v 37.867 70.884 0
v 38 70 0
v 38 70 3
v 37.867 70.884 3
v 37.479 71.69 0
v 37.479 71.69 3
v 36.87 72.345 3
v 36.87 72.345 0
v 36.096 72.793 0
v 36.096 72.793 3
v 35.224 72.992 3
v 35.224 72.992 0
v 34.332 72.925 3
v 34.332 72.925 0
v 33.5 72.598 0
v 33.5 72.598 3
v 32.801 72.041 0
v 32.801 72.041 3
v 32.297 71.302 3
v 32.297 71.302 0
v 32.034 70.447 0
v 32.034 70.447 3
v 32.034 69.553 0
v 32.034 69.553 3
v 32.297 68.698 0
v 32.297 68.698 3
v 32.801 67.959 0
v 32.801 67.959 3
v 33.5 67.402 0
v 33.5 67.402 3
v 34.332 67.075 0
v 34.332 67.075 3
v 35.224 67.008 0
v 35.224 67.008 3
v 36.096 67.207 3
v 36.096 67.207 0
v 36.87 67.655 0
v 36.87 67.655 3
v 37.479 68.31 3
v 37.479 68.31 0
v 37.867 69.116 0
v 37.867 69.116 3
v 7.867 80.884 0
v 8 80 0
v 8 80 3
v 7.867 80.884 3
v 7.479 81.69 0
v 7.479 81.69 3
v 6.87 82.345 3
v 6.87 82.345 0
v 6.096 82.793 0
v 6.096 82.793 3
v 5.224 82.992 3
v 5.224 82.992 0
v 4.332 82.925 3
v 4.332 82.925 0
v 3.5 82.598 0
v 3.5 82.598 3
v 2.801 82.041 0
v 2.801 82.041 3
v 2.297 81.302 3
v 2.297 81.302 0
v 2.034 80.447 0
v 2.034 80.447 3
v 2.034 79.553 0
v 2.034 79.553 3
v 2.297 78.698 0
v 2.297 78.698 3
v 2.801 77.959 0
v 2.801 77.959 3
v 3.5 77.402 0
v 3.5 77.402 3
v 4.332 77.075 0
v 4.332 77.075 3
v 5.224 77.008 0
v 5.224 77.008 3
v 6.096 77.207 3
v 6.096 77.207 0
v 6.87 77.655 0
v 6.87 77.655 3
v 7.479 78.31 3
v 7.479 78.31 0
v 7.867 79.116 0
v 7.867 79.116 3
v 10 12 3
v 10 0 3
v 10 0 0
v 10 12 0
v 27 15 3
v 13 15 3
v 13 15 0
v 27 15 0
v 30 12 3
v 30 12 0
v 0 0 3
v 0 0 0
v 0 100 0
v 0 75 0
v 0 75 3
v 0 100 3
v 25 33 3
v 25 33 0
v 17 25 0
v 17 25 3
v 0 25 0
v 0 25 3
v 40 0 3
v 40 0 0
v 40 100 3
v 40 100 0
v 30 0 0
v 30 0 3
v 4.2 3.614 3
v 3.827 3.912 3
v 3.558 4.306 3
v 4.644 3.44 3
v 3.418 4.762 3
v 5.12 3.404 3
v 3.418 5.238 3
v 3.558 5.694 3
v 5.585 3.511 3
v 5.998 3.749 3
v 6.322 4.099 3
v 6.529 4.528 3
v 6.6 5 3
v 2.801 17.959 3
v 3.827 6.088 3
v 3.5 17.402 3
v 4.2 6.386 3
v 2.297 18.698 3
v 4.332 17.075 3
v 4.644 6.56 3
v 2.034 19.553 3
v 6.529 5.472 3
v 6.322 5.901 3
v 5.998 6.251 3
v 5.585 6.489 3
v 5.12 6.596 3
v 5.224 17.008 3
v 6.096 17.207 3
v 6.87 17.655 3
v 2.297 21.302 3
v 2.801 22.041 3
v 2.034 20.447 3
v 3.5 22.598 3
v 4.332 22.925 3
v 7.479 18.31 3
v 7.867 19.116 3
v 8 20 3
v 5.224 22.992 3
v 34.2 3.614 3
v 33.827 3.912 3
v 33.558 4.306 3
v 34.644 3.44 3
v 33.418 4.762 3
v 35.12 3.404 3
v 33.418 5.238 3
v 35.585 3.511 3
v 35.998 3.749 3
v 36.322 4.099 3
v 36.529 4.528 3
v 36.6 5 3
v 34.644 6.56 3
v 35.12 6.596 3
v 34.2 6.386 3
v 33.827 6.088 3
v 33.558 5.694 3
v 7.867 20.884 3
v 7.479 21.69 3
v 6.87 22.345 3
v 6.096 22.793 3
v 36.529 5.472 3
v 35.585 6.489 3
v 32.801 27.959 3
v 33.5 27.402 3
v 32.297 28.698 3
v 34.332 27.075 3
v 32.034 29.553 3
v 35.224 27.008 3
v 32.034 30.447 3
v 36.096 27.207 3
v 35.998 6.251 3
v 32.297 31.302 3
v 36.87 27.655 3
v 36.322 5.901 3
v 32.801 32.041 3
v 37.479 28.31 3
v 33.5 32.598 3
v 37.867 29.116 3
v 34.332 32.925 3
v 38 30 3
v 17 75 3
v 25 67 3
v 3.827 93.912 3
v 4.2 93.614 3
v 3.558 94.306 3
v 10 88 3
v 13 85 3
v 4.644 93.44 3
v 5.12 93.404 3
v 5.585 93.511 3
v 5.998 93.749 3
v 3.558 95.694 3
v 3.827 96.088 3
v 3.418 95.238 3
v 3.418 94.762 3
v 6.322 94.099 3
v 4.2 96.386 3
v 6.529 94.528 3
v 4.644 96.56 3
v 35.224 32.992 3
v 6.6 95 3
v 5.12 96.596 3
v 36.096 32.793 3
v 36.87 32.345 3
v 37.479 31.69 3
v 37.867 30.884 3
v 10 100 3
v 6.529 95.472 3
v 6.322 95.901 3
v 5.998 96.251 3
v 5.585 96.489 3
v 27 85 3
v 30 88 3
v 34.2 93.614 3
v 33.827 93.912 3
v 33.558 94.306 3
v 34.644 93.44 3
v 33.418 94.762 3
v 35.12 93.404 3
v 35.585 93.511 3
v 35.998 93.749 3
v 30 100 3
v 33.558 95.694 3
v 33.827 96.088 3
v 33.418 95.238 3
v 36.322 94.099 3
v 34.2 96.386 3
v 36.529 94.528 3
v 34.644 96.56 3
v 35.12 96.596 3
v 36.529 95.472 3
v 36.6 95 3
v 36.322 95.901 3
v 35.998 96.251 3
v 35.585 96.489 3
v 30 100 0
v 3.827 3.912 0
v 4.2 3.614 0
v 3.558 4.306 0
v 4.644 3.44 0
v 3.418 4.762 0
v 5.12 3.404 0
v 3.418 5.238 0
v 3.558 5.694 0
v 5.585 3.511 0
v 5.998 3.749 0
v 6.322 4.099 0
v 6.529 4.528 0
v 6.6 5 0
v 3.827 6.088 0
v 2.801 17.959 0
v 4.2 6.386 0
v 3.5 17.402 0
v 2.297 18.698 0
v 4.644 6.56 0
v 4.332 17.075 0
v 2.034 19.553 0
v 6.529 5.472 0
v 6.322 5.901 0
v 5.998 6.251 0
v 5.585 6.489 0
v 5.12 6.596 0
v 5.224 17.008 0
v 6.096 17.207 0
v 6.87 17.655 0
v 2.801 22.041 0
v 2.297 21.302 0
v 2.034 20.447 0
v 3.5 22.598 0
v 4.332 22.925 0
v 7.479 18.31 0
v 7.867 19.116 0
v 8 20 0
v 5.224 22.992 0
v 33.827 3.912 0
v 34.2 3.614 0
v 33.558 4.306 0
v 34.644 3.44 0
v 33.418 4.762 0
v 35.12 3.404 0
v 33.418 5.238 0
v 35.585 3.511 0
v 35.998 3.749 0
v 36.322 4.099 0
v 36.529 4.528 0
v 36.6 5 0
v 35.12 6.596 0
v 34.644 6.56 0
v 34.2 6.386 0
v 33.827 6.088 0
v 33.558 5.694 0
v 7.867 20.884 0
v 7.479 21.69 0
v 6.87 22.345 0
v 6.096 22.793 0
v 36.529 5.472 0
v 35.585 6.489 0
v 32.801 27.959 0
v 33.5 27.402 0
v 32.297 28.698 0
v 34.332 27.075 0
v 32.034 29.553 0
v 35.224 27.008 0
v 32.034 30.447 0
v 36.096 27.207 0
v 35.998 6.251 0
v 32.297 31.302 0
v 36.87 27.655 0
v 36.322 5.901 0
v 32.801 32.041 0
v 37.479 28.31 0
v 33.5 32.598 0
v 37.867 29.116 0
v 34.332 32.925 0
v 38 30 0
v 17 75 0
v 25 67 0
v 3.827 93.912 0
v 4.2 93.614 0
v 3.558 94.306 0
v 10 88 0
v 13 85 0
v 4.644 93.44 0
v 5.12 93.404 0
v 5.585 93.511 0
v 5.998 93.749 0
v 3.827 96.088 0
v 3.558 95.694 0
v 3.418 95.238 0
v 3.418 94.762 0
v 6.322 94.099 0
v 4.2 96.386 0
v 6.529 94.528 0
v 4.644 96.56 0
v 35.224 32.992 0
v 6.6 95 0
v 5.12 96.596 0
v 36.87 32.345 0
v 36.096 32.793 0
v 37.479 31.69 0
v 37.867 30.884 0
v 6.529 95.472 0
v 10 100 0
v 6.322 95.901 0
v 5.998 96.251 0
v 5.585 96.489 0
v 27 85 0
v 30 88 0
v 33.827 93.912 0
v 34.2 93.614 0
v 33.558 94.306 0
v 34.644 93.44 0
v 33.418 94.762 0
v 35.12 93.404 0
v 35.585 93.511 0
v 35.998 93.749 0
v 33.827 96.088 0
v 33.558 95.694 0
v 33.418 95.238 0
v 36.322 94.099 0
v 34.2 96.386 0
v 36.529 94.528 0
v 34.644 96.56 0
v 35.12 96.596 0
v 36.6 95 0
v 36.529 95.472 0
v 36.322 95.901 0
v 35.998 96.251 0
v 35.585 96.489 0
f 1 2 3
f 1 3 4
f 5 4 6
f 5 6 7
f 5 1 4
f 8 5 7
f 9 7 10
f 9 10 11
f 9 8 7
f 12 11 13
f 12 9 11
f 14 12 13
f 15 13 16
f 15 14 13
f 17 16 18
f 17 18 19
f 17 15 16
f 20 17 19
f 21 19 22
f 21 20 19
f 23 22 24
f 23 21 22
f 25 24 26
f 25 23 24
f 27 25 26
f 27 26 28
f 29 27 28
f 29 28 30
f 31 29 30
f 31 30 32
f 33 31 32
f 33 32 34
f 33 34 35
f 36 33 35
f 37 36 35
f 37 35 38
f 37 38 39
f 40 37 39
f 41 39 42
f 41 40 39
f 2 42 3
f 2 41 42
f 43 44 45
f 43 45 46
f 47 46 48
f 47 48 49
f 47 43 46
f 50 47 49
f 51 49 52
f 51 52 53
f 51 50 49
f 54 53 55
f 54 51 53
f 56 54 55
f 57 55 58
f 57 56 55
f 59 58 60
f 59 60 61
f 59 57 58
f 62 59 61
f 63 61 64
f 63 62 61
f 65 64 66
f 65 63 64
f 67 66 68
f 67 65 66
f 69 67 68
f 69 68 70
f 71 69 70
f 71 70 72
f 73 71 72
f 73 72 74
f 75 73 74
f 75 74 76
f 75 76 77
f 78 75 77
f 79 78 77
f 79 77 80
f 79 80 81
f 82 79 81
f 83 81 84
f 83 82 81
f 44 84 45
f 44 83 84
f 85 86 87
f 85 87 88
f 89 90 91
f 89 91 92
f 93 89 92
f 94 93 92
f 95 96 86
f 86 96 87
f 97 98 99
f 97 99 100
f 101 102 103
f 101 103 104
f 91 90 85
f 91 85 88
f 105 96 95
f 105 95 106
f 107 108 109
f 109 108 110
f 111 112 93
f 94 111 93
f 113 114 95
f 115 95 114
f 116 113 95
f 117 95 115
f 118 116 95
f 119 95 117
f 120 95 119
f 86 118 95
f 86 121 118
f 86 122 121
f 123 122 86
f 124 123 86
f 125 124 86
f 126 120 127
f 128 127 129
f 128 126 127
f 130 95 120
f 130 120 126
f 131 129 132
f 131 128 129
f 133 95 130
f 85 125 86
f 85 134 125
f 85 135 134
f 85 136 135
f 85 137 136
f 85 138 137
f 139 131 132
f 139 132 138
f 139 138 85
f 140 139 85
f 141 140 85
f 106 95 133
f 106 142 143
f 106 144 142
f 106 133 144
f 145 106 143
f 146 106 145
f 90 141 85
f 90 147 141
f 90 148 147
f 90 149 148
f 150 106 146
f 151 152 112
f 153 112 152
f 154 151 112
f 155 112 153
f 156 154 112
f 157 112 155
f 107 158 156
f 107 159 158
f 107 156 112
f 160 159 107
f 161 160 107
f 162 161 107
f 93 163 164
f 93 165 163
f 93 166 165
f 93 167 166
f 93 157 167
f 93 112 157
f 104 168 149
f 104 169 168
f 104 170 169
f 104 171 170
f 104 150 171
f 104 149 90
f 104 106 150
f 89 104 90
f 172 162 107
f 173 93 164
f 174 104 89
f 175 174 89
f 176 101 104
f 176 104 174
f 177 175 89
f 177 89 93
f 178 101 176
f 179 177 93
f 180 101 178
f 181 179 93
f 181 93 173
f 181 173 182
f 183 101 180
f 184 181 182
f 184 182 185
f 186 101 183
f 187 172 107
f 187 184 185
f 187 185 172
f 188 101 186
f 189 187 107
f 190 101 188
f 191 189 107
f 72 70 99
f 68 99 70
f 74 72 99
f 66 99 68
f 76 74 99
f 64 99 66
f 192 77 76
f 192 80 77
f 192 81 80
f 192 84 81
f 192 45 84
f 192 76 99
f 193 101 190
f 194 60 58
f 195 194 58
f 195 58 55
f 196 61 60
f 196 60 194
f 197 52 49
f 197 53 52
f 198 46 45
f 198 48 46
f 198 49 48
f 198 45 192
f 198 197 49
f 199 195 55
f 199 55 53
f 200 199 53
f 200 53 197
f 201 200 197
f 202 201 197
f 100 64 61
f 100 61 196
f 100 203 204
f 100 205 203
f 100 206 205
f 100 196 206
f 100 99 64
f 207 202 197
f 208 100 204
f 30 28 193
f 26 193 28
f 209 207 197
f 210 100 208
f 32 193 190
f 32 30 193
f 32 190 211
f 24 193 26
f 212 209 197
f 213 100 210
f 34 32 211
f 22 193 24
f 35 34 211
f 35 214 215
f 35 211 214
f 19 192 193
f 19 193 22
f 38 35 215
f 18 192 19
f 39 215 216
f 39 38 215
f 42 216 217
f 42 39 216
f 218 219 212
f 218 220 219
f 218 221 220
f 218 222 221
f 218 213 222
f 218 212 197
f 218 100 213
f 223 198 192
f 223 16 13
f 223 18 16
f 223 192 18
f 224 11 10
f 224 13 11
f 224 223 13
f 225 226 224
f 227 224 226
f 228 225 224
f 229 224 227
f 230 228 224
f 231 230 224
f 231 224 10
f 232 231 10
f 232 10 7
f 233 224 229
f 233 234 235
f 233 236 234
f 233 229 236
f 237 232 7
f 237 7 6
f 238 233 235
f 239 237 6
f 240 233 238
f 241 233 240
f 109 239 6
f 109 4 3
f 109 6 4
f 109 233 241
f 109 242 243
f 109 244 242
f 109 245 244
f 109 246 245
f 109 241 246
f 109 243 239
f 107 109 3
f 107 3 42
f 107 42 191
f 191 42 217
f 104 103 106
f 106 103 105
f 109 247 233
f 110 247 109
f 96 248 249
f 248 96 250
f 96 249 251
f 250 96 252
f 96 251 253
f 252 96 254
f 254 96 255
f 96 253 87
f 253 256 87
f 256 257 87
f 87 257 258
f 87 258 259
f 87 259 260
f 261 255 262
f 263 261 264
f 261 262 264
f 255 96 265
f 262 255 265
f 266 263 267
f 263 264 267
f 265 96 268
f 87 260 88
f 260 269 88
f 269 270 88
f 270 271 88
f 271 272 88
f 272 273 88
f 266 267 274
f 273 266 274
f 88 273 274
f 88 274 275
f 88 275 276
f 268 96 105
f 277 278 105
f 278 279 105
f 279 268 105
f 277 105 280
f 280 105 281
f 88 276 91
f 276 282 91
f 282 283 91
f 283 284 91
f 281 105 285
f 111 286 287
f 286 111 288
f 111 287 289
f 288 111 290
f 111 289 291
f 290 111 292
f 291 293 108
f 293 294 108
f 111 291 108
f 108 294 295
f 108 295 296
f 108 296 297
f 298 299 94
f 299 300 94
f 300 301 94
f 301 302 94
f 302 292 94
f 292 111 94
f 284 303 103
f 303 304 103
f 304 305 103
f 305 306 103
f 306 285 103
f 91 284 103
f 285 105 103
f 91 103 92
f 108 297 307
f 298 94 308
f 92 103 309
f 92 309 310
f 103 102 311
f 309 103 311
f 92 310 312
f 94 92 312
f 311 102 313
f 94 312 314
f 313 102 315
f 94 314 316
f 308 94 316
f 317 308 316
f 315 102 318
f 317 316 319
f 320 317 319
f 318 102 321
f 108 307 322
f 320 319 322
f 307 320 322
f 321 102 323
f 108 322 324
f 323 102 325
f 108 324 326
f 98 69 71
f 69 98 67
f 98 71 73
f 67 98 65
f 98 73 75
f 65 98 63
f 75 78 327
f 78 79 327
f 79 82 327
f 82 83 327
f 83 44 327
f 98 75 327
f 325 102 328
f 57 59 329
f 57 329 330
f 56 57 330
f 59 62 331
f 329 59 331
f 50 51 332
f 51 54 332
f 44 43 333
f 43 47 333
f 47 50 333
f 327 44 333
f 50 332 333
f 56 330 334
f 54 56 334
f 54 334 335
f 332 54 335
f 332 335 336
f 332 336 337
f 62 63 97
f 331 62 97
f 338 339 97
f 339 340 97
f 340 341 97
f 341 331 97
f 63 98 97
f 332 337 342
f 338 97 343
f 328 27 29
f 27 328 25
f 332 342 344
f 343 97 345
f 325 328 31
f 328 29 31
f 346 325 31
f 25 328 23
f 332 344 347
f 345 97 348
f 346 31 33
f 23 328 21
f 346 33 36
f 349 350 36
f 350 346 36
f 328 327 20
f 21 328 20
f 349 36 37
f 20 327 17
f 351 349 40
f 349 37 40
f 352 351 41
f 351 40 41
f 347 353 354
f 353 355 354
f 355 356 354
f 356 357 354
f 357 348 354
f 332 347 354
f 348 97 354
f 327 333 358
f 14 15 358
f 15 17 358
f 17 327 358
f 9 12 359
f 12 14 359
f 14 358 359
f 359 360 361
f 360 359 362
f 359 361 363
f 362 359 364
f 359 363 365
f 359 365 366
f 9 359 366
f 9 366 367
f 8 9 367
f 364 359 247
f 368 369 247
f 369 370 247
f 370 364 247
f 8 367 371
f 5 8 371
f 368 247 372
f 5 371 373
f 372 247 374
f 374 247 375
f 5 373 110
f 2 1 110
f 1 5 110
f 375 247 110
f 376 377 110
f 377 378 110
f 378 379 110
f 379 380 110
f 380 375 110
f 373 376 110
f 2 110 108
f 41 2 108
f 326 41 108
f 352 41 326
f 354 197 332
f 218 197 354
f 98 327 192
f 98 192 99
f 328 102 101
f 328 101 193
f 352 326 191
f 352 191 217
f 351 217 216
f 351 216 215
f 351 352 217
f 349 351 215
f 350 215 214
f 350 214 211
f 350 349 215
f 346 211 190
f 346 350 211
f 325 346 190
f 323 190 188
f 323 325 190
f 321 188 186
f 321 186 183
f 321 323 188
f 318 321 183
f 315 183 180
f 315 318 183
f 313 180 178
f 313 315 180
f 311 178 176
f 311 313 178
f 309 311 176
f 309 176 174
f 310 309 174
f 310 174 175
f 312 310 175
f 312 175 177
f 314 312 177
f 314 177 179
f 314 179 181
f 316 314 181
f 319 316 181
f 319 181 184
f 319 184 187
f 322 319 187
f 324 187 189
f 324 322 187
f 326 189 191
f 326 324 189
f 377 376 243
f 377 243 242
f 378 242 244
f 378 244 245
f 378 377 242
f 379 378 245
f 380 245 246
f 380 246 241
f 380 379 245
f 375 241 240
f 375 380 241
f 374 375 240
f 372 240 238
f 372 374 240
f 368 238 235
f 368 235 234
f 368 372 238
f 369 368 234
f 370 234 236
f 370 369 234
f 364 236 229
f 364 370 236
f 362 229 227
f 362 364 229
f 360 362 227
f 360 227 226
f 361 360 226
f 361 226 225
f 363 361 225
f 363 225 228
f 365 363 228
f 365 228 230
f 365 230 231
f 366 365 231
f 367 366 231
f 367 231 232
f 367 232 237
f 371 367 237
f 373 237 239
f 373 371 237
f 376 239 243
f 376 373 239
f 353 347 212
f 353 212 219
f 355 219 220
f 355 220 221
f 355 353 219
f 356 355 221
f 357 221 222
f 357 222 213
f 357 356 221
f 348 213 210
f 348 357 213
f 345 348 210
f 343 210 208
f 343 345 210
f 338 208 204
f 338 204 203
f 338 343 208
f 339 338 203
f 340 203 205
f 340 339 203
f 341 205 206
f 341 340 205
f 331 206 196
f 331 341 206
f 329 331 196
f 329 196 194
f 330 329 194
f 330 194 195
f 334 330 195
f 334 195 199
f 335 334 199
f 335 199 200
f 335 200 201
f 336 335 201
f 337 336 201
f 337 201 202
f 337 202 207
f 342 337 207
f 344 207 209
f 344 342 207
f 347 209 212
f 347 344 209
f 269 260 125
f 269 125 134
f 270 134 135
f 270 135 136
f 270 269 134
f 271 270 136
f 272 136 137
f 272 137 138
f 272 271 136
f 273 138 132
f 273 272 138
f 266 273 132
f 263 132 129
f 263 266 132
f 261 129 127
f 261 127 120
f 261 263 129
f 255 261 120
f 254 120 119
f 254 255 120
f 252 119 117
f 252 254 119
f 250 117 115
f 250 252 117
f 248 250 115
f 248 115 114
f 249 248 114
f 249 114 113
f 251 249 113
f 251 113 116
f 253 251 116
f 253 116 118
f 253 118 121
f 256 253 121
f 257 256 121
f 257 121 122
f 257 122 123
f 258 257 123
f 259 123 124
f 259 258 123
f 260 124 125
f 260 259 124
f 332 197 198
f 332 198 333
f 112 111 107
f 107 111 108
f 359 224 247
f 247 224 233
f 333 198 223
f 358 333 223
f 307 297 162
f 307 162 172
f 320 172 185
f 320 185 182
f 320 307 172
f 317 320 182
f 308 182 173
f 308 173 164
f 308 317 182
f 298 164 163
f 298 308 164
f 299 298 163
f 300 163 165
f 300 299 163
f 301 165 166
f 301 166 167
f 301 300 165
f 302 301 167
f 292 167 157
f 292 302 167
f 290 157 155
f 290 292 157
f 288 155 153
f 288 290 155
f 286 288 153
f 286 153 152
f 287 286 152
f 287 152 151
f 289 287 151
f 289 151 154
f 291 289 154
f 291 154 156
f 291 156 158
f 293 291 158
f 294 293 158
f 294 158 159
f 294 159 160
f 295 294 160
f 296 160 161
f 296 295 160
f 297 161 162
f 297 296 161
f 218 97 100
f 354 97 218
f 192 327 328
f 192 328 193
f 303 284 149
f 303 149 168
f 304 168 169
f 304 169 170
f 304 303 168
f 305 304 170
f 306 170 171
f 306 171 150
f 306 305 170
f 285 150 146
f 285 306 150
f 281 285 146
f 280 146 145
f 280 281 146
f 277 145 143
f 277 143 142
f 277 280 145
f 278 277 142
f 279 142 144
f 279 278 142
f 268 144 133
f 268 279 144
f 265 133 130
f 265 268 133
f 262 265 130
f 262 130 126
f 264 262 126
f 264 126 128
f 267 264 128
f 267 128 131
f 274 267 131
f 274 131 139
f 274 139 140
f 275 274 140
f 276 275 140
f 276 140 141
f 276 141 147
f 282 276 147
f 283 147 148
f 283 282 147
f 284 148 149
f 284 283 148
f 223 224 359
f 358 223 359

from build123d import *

# Parameters (mm, degrees)
SKETCH_1_W          = 40
SKETCH_1_H          = 100
SKETCH_1_R          = 1.6
SKETCH_1_R_2        = 3
EXTRUDE_1_DEPTH     = 3
SKETCH_2_W          = 20
SKETCH_2_H          = 15
CUT_EXTRUDE_1_DEPTH = 108.745069493
CHAMFER_1_SIZE      = 3
SKETCH_3_W          = 25
SKETCH_3_H          = 50
CUT_EXTRUDE_2_DEPTH = 108.745069493
CHAMFER_2_SIZE      = 8


with BuildPart() as part:
    # ｽｹｯﾁ1 → ﾎﾞｽ - 押し出し1 (new body)
    with BuildSketch(Plane.XY):
        with Locations((20, 50)):
            Rectangle(SKETCH_1_W, SKETCH_1_H)
        with Locations((5, 95)):
            Circle(SKETCH_1_R, mode=Mode.SUBTRACT)
        with Locations((35, 95)):
            Circle(SKETCH_1_R, mode=Mode.SUBTRACT)
        with Locations((5, 80)):
            Circle(SKETCH_1_R_2, mode=Mode.SUBTRACT)
        with Locations((35, 70)):
            Circle(SKETCH_1_R_2, mode=Mode.SUBTRACT)
        with Locations((5, 20)):
            Circle(SKETCH_1_R_2, mode=Mode.SUBTRACT)
        with Locations((35, 30)):
            Circle(SKETCH_1_R_2, mode=Mode.SUBTRACT)
        with Locations((5, 5)):
            Circle(SKETCH_1_R, mode=Mode.SUBTRACT)
        with Locations((35, 5)):
            Circle(SKETCH_1_R, mode=Mode.SUBTRACT)
    extrude(amount=EXTRUDE_1_DEPTH)

    # ｽｹｯﾁ2 → ｶｯﾄ - 押し出し1 (cut, through all)
    with BuildSketch(Plane.XY.offset(3)):
        with Locations((20, 92.5)):
            Rectangle(SKETCH_2_W, SKETCH_2_H)
        with Locations((20, 7.5)):
            Rectangle(SKETCH_2_W, SKETCH_2_H)
    extrude(amount=-CUT_EXTRUDE_1_DEPTH, mode=Mode.SUBTRACT)

    # 面取り1
    chamfer_1_edges = [part.edges().sort_by_distance(p)[0] for p in [
        (10, 85, 1.5),
        (30, 85, 1.5),
        (10, 15, 1.5),
        (30, 15, 1.5),
    ]]
    chamfer(chamfer_1_edges, length=CHAMFER_1_SIZE)

    # ｽｹｯﾁ3 → ｶｯﾄ - 押し出し2 (cut, through all)
    with BuildSketch(Plane(origin=(0, 0, 0), x_dir=(-1, 0, 0), z_dir=(0, 0, -1))):
        with Locations((-12.5, 50)):
            Rectangle(SKETCH_3_W, SKETCH_3_H)
    extrude(amount=-CUT_EXTRUDE_2_DEPTH, mode=Mode.SUBTRACT)

    # 面取り2
    chamfer_2_edges = [part.edges().sort_by_distance(p)[0] for p in [
        (25, 25, 1.5),
        (25, 75, 1.5),
    ]]
    chamfer(chamfer_2_edges, length=CHAMFER_2_SIZE)


solid = part.part
